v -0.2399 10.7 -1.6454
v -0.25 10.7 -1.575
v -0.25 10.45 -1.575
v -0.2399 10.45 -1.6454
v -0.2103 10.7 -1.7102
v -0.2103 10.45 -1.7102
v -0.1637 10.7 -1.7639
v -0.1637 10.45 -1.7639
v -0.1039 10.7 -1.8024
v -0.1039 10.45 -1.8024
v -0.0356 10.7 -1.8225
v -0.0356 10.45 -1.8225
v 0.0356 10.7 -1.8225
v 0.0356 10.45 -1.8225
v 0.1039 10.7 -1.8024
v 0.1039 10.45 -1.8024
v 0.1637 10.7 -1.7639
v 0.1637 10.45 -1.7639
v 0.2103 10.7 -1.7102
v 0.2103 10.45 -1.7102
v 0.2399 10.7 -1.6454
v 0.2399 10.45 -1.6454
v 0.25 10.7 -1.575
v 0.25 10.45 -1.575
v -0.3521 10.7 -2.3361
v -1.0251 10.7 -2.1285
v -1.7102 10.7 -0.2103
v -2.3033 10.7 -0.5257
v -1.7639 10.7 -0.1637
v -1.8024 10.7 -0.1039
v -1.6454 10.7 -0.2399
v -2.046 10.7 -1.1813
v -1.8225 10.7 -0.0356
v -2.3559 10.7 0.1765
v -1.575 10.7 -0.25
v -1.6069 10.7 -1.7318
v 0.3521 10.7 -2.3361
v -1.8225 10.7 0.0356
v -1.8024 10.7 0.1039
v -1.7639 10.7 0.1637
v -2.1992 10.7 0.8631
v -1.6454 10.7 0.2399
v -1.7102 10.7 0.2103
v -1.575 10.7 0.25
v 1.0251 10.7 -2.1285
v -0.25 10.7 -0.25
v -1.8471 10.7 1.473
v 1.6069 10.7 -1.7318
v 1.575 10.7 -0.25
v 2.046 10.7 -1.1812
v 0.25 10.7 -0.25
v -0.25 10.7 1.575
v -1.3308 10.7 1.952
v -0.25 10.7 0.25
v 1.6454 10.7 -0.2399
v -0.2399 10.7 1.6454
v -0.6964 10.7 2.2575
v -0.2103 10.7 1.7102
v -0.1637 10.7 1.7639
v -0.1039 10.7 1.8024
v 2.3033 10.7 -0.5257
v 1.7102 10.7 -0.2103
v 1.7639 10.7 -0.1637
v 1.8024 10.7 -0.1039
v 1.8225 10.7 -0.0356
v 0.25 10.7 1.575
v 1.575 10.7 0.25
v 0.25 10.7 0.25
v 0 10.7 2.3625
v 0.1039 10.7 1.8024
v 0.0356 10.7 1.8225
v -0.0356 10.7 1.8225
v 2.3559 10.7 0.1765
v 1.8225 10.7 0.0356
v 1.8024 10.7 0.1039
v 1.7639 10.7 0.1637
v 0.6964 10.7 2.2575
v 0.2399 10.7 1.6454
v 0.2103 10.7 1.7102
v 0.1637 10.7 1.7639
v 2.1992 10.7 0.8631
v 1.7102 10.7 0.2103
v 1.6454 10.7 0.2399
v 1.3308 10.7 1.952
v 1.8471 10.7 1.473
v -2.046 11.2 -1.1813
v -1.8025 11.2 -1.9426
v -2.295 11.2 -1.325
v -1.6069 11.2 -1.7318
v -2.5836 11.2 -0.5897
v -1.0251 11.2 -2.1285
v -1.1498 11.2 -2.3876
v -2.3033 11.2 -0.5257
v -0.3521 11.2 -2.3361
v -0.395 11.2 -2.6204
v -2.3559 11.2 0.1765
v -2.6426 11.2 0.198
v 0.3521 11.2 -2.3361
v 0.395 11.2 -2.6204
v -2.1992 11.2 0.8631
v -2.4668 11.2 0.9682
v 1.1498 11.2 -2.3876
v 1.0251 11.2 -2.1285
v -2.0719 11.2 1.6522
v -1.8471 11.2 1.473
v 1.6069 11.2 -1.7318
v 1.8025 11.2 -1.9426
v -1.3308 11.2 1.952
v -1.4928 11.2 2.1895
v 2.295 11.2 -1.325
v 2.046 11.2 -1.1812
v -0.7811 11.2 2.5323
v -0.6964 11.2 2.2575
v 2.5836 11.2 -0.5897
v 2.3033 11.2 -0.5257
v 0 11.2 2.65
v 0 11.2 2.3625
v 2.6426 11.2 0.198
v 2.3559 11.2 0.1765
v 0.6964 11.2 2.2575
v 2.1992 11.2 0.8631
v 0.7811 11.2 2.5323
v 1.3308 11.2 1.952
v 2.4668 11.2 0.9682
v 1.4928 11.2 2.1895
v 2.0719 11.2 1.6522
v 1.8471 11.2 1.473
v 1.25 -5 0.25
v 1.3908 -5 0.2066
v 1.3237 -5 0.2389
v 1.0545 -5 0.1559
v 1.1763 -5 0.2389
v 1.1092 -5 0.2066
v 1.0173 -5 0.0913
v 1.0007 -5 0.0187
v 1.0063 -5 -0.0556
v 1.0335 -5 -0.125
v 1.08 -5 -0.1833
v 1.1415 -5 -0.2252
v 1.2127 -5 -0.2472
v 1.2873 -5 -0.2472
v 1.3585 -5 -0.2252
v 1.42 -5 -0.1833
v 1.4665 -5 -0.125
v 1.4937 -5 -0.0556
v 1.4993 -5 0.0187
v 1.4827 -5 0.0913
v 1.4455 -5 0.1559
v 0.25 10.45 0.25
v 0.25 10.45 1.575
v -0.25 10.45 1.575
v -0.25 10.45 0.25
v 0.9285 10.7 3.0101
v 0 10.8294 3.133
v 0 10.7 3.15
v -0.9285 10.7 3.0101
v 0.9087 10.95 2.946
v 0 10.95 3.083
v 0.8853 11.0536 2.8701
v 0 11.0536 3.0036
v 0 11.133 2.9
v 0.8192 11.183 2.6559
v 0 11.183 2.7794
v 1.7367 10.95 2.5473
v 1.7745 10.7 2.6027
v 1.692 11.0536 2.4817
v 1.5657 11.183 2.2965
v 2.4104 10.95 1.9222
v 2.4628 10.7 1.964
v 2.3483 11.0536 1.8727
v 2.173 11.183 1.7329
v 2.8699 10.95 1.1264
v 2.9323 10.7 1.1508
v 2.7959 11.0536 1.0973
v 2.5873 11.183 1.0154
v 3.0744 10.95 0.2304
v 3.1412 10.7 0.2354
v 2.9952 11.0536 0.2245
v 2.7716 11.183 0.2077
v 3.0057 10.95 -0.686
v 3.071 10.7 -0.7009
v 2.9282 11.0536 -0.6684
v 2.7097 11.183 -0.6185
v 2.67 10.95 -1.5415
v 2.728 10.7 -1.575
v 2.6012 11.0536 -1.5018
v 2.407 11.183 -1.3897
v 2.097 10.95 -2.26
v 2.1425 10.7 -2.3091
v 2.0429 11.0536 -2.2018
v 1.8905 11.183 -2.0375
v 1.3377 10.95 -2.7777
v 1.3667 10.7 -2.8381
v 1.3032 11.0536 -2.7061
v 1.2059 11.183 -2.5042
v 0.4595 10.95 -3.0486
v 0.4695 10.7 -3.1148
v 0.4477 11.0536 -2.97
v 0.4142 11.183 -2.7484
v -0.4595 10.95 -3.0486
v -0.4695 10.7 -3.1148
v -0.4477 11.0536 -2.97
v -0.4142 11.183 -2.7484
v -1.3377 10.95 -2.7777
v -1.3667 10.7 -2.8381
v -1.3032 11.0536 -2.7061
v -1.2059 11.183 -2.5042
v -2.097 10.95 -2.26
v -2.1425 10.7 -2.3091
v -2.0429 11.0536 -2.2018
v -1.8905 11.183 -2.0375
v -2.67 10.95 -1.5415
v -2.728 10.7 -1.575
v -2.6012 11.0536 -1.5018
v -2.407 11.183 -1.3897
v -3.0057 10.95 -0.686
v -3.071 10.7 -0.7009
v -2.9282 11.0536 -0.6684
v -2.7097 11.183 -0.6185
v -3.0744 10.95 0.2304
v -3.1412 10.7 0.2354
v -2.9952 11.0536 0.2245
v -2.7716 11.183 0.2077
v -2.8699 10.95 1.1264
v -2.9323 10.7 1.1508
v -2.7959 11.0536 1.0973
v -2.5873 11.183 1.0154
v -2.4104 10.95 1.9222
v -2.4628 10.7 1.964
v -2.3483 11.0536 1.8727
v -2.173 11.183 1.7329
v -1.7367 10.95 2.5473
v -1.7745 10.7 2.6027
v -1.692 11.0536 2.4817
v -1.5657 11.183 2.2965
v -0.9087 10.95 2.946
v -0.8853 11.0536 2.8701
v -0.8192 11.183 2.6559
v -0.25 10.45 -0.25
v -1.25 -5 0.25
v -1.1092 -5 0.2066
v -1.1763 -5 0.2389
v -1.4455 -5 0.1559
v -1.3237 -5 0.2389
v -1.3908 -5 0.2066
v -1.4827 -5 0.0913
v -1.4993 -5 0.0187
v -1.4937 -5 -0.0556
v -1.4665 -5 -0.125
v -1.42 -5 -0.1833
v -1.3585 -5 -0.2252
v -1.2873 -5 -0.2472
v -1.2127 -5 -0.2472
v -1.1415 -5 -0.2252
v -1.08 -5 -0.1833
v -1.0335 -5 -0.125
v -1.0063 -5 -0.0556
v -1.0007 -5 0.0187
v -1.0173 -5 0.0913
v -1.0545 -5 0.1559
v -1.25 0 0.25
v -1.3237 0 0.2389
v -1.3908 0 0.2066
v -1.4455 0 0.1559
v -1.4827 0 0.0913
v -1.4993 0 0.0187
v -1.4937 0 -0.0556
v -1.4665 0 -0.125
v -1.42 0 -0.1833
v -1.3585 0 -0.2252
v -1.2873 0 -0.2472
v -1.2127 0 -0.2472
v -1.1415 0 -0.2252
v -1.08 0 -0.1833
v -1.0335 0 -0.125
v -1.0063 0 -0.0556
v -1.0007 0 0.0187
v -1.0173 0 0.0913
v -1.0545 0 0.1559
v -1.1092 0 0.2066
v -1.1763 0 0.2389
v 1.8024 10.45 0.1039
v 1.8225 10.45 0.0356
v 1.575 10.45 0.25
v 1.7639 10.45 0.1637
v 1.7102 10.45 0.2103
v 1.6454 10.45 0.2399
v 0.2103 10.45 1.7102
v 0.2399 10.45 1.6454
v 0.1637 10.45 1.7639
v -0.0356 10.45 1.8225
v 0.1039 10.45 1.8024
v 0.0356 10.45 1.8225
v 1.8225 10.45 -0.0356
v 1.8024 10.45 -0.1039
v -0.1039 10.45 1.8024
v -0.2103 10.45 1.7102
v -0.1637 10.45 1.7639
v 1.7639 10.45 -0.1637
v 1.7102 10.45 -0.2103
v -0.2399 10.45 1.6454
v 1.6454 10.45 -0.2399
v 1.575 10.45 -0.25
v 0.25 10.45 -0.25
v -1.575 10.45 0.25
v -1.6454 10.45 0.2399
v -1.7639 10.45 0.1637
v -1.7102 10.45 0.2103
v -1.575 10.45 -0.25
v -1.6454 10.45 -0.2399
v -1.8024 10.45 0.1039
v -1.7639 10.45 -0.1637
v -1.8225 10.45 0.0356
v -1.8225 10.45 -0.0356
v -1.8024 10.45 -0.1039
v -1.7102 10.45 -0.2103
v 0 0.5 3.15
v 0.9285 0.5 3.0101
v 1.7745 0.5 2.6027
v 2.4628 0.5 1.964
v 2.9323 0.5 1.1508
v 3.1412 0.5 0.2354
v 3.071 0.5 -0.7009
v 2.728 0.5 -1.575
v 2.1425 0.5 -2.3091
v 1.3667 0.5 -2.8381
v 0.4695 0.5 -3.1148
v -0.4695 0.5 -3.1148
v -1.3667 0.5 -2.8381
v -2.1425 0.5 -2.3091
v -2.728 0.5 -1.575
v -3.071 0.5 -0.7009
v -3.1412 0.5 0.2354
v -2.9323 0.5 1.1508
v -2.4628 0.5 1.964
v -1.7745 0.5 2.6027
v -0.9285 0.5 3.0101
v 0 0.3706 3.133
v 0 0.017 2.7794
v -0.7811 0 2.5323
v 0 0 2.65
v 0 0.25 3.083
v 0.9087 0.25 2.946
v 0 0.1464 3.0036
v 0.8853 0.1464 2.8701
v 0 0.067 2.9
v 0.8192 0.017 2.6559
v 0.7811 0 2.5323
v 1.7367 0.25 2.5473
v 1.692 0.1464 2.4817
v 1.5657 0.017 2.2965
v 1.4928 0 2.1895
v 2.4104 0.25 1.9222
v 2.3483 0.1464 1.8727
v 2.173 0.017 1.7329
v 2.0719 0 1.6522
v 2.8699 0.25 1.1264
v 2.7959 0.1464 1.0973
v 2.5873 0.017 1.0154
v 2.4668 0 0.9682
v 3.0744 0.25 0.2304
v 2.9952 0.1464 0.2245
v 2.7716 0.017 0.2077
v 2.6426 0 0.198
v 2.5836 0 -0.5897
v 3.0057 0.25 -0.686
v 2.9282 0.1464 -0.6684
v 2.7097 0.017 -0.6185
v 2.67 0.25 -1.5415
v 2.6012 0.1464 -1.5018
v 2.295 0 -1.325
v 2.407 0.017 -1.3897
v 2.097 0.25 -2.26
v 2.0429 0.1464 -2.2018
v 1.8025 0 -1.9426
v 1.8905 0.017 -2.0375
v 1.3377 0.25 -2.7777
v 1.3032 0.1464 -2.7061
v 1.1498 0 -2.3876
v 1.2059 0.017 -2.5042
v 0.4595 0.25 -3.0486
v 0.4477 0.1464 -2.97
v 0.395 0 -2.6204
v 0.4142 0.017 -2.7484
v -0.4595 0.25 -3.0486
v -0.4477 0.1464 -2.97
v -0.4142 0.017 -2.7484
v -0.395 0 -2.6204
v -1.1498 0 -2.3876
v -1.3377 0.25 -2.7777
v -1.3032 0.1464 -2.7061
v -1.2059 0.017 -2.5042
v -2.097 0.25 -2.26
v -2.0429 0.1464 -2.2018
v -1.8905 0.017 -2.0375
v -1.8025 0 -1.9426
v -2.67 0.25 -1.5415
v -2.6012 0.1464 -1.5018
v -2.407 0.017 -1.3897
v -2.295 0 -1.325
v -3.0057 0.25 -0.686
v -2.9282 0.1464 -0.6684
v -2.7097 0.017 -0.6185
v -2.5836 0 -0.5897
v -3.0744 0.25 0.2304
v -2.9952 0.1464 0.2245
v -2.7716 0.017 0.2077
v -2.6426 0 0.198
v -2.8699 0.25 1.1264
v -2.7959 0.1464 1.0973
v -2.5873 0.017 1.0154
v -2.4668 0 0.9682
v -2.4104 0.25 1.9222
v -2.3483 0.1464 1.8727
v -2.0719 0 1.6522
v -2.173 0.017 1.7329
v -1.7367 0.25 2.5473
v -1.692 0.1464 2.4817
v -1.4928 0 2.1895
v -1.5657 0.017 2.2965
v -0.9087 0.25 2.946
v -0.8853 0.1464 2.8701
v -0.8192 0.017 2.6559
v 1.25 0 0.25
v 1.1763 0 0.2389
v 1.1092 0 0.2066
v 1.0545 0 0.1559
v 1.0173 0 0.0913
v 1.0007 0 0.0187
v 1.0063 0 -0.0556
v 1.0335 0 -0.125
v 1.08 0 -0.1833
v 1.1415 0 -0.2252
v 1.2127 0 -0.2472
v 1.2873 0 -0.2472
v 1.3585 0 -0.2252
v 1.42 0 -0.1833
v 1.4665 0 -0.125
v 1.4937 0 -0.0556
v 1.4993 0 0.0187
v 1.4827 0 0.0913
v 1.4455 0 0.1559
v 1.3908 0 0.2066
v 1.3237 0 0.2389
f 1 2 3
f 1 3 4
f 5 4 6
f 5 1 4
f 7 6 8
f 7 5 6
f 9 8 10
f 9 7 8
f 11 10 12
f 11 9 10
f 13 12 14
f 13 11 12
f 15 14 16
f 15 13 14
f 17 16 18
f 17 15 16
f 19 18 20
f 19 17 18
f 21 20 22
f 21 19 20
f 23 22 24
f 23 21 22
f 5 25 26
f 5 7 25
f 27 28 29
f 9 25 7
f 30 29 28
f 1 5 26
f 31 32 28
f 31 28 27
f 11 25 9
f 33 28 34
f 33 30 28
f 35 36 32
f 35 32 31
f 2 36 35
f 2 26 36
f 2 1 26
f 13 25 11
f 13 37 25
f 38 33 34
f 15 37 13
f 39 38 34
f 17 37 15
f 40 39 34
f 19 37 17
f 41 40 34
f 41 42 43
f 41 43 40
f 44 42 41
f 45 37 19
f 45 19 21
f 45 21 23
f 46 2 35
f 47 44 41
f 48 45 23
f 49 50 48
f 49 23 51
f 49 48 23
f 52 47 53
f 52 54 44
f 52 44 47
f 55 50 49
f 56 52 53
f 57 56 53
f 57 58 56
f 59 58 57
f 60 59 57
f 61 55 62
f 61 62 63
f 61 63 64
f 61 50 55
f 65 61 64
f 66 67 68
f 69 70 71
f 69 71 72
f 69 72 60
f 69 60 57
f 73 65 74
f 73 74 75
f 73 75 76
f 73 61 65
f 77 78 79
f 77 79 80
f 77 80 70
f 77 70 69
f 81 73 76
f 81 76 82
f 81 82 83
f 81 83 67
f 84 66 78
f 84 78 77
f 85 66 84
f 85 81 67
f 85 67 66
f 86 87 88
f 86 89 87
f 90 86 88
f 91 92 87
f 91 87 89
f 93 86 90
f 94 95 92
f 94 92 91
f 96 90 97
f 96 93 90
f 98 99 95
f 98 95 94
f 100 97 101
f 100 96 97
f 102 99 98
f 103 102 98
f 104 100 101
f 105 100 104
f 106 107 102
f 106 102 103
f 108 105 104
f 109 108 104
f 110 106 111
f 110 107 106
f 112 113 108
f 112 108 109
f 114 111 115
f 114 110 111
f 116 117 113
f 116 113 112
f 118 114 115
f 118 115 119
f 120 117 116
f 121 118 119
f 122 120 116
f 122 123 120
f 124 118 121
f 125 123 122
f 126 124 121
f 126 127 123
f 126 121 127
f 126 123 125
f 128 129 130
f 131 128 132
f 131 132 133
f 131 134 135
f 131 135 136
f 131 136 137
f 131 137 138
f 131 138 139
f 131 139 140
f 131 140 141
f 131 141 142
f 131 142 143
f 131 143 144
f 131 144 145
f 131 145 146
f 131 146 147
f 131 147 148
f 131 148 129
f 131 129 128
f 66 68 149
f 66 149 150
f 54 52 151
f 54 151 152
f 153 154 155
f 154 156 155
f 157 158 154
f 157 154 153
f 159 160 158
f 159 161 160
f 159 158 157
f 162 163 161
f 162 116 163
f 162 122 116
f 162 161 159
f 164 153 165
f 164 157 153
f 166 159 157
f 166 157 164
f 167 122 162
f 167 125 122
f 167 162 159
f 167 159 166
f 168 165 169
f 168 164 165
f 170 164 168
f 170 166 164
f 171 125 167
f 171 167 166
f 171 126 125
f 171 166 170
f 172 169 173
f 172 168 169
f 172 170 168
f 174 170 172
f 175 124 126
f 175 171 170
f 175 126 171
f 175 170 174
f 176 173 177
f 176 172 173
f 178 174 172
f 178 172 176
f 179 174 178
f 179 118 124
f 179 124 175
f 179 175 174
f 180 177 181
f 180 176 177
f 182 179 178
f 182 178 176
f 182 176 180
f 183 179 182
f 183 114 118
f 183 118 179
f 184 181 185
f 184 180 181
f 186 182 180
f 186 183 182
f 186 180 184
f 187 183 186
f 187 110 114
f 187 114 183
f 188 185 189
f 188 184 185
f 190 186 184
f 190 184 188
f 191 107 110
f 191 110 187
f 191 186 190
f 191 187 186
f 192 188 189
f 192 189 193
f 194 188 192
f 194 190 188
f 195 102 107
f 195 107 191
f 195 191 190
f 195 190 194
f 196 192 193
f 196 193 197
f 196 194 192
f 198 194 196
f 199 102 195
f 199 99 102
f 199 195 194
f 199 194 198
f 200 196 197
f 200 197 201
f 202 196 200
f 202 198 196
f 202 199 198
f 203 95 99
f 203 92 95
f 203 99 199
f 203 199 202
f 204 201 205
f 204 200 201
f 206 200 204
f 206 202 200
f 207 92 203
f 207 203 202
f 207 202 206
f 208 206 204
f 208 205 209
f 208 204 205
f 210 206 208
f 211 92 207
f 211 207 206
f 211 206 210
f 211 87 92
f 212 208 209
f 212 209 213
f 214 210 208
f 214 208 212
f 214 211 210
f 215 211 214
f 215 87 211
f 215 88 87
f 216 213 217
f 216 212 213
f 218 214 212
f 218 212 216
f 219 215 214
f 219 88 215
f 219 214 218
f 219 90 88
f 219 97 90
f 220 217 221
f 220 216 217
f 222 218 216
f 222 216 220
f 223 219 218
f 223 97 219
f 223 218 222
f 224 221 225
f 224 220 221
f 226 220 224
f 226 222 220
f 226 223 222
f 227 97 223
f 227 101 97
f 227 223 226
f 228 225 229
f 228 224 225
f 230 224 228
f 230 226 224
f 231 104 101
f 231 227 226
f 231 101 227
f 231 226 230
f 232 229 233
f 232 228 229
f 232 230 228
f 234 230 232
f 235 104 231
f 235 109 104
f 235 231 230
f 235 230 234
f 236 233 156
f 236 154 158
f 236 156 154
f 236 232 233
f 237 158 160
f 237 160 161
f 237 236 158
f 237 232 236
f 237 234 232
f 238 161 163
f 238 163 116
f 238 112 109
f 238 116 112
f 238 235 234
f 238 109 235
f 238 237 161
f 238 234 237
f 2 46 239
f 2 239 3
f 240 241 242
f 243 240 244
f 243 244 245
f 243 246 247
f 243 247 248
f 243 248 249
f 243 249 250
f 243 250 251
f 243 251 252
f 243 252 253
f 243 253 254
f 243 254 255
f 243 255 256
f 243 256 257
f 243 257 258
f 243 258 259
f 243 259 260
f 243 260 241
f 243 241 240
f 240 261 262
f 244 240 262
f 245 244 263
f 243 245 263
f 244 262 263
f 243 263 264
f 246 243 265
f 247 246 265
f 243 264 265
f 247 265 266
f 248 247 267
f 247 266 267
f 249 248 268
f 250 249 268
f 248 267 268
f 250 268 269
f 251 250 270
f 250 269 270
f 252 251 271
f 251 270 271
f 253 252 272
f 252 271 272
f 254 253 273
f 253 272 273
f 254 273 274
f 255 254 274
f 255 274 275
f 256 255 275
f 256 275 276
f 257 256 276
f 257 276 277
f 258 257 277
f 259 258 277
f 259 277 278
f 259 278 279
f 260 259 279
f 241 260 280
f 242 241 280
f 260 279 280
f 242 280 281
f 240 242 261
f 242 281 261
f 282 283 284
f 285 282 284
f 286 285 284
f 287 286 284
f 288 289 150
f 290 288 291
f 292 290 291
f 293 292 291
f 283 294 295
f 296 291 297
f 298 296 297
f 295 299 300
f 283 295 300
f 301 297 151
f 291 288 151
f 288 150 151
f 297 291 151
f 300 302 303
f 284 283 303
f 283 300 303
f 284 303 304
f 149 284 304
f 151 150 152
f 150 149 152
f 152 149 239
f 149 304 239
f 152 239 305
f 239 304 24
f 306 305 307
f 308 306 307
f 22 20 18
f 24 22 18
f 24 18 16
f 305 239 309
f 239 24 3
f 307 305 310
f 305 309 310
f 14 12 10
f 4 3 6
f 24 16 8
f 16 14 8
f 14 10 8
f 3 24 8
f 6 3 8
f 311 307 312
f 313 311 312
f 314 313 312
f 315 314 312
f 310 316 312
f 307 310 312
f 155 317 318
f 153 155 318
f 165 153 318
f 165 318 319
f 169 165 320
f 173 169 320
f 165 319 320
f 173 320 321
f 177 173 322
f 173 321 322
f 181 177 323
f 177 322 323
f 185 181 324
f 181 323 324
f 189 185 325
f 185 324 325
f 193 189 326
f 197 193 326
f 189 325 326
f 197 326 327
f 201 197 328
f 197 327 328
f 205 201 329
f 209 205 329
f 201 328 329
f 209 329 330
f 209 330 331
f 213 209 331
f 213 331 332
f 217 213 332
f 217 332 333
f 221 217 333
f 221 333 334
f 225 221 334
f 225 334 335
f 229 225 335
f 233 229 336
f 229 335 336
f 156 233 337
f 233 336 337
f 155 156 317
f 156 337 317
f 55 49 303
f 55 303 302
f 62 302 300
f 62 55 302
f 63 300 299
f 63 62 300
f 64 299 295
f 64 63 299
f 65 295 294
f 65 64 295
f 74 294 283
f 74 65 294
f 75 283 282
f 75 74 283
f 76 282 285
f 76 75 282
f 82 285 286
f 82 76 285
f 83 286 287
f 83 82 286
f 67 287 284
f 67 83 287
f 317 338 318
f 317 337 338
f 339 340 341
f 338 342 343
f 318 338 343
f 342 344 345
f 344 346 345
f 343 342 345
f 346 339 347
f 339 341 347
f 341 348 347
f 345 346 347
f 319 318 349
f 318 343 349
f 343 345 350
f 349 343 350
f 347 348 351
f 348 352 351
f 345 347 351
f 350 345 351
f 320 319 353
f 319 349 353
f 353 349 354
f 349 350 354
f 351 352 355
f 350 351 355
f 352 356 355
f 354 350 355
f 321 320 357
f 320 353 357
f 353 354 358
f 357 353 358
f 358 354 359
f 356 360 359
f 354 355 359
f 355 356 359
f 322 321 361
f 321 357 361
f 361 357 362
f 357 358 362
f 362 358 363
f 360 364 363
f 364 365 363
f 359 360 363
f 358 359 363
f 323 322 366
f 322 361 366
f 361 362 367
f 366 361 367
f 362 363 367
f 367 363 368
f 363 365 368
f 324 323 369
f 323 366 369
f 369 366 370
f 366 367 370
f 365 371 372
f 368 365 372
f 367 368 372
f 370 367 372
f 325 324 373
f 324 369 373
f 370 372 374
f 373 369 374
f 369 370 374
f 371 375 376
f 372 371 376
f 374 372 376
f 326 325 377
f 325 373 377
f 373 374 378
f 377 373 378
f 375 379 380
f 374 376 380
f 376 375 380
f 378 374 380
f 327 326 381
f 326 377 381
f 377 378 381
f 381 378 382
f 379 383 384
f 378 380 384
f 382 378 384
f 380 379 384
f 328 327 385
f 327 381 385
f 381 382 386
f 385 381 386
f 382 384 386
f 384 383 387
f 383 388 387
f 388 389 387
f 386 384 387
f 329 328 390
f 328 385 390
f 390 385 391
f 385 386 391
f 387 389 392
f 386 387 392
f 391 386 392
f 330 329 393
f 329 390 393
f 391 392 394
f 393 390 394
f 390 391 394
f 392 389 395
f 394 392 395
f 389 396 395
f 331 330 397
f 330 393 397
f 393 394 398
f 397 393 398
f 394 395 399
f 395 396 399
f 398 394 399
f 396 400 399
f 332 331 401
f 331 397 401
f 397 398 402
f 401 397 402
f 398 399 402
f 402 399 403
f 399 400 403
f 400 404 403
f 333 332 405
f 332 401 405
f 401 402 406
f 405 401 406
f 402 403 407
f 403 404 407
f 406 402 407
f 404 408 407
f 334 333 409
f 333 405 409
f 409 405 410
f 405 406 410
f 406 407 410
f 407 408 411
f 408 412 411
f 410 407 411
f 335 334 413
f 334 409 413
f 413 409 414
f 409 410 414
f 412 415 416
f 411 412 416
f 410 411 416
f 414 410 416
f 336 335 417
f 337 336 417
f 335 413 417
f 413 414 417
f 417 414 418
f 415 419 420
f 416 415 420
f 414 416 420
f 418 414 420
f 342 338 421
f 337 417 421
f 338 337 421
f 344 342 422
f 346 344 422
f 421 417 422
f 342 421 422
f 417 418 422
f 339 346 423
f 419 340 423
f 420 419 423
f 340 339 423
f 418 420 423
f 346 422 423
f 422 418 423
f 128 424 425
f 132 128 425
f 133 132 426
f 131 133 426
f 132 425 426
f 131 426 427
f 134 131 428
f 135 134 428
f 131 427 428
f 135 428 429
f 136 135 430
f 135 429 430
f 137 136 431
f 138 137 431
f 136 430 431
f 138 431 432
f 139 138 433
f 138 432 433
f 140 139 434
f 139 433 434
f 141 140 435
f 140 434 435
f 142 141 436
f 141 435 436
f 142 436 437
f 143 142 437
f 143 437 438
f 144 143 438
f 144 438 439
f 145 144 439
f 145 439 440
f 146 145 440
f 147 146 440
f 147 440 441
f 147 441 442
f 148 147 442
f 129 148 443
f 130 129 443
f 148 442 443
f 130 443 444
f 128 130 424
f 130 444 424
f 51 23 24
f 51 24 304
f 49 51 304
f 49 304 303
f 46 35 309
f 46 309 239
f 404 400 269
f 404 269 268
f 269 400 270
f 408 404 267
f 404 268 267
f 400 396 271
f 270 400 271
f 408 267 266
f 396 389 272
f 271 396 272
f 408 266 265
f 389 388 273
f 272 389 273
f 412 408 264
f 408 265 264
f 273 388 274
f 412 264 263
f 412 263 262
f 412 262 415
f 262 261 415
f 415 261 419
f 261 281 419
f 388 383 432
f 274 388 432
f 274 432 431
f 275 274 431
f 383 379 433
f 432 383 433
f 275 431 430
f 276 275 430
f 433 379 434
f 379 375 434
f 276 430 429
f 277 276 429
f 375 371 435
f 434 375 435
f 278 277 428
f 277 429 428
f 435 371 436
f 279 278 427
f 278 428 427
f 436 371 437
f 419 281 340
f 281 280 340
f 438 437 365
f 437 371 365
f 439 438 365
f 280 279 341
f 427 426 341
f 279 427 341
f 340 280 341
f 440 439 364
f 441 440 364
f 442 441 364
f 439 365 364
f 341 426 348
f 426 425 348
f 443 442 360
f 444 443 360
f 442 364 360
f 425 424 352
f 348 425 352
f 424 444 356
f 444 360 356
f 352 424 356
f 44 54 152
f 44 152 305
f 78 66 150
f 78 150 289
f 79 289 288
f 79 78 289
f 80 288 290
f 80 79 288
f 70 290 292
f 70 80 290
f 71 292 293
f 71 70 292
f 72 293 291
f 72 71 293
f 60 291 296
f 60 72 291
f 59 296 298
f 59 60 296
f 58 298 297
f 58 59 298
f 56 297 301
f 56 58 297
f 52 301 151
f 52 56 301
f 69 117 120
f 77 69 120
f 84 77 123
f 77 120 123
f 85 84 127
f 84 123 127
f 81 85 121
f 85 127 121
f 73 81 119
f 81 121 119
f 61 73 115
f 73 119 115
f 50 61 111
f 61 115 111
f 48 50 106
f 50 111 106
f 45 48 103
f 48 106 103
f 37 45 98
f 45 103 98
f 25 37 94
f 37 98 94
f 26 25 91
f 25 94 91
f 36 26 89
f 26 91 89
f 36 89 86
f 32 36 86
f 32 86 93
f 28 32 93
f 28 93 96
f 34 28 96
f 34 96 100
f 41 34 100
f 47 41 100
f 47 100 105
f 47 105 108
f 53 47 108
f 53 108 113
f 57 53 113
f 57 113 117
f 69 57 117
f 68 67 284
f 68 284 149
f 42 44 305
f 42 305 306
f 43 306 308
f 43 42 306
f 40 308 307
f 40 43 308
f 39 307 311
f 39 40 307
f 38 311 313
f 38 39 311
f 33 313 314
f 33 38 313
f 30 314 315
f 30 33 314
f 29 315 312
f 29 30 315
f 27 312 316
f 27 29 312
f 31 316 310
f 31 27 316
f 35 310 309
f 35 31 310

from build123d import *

# Parameters (mm, degrees)
SKETCH_2_R          = 3.15
EXTRUDE_1_DEPTH     = 11.2
FILLET_1_R          = 0.5
SKETCH_3_R          = 0.25
EXTRUDE_2_DEPTH     = 5
SKETCH_5_R          = 2.3625
CUT_EXTRUDE_1_DEPTH = 1
EXTRUDE_START       = 0.5
SKETCH_6_R          = 2.3625
EXTRUDE_3_DEPTH     = 0.5
CUT_EXTRUDE_2_DEPTH = 0.25
CUT_EXTRUDE_3_DEPTH = 0.25


with BuildPart() as part:
    # 草图2 → 凸台-拉伸1 (new body)
    with BuildSketch(Plane(origin=(0, 0, 0), x_dir=(1, 0, 0), z_dir=(0, 1, 0))):
        with Locations(Location((0, 0, 0), (0, 0, 270))):
            Circle(SKETCH_2_R)
    extrude(amount=EXTRUDE_1_DEPTH)

    # 圆角1
    fillet_1_edges = [part.edges().sort_by_distance(p)[0] for p in [
        (0, 0, -3.15),
        (0, 11.2, -3.15),
    ]]
    fillet(fillet_1_edges, radius=FILLET_1_R)

    # 草图3 → 凸台-拉伸2 (add)
    with BuildSketch(Plane.XZ):
        with Locations(Location((-1.25, 0, 0), (0, 0, 90))):
            Circle(SKETCH_3_R)
        with Locations(Location((1.25, 0, 0), (0, 0, 90))):
            Circle(SKETCH_3_R)
    extrude(amount=EXTRUDE_2_DEPTH)

    # 草图5 → 切除-拉伸1 (cut)
    with BuildSketch(Plane(origin=(0, 11.2, 0), x_dir=(1, 0, 0), z_dir=(0, 1, 0))):
        with Locations(Location((0, 0, 0), (0, 0, 270))):
            Circle(SKETCH_5_R)
    extrude(amount=-CUT_EXTRUDE_1_DEPTH, mode=Mode.SUBTRACT)

    # 草图6 → 凸台-拉伸3 (add)
    with BuildSketch(Plane(origin=(0, 10.2, 0), x_dir=(1, 0, 0), z_dir=(0, 1, 0)).offset(EXTRUDE_START)):
        with Locations(Location((0, 0, 0), (0, 0, 270))):
            Circle(SKETCH_6_R)
    extrude(amount=-EXTRUDE_3_DEPTH)

    # 草图7 → 切除-拉伸2 (cut)
    with BuildSketch(Plane(origin=(0, 10.7, 0), x_dir=(1, 0, 0), z_dir=(0, 1, 0))):
        with BuildLine():
            Line((-1.575, 0.25), (1.575, 0.25))
            ThreePointArc((1.575, 0.25), (1.825, 0), (1.575, -0.25))
            Line((1.575, -0.25), (-1.575, -0.25))
            ThreePointArc((-1.575, -0.25), (-1.825, 0), (-1.575, 0.25))
        make_face()
    extrude(amount=-CUT_EXTRUDE_2_DEPTH, mode=Mode.SUBTRACT)

    # 草图8 → 切除-拉伸3 (cut)
    with BuildSketch(Plane(origin=(0, 10.7, 0), x_dir=(1, 0, 0), z_dir=(0, 1, 0))):
        with BuildLine():
            Line((-0.25, -1.575), (-0.25, 1.575))
            ThreePointArc((-0.25, 1.575), (0, 1.825), (0.25, 1.575))
            Line((0.25, 1.575), (0.25, -1.575))
            ThreePointArc((0.25, -1.575), (0, -1.825), (-0.25, -1.575))
        make_face()
    extrude(amount=-CUT_EXTRUDE_3_DEPTH, mode=Mode.SUBTRACT)


solid = part.part
